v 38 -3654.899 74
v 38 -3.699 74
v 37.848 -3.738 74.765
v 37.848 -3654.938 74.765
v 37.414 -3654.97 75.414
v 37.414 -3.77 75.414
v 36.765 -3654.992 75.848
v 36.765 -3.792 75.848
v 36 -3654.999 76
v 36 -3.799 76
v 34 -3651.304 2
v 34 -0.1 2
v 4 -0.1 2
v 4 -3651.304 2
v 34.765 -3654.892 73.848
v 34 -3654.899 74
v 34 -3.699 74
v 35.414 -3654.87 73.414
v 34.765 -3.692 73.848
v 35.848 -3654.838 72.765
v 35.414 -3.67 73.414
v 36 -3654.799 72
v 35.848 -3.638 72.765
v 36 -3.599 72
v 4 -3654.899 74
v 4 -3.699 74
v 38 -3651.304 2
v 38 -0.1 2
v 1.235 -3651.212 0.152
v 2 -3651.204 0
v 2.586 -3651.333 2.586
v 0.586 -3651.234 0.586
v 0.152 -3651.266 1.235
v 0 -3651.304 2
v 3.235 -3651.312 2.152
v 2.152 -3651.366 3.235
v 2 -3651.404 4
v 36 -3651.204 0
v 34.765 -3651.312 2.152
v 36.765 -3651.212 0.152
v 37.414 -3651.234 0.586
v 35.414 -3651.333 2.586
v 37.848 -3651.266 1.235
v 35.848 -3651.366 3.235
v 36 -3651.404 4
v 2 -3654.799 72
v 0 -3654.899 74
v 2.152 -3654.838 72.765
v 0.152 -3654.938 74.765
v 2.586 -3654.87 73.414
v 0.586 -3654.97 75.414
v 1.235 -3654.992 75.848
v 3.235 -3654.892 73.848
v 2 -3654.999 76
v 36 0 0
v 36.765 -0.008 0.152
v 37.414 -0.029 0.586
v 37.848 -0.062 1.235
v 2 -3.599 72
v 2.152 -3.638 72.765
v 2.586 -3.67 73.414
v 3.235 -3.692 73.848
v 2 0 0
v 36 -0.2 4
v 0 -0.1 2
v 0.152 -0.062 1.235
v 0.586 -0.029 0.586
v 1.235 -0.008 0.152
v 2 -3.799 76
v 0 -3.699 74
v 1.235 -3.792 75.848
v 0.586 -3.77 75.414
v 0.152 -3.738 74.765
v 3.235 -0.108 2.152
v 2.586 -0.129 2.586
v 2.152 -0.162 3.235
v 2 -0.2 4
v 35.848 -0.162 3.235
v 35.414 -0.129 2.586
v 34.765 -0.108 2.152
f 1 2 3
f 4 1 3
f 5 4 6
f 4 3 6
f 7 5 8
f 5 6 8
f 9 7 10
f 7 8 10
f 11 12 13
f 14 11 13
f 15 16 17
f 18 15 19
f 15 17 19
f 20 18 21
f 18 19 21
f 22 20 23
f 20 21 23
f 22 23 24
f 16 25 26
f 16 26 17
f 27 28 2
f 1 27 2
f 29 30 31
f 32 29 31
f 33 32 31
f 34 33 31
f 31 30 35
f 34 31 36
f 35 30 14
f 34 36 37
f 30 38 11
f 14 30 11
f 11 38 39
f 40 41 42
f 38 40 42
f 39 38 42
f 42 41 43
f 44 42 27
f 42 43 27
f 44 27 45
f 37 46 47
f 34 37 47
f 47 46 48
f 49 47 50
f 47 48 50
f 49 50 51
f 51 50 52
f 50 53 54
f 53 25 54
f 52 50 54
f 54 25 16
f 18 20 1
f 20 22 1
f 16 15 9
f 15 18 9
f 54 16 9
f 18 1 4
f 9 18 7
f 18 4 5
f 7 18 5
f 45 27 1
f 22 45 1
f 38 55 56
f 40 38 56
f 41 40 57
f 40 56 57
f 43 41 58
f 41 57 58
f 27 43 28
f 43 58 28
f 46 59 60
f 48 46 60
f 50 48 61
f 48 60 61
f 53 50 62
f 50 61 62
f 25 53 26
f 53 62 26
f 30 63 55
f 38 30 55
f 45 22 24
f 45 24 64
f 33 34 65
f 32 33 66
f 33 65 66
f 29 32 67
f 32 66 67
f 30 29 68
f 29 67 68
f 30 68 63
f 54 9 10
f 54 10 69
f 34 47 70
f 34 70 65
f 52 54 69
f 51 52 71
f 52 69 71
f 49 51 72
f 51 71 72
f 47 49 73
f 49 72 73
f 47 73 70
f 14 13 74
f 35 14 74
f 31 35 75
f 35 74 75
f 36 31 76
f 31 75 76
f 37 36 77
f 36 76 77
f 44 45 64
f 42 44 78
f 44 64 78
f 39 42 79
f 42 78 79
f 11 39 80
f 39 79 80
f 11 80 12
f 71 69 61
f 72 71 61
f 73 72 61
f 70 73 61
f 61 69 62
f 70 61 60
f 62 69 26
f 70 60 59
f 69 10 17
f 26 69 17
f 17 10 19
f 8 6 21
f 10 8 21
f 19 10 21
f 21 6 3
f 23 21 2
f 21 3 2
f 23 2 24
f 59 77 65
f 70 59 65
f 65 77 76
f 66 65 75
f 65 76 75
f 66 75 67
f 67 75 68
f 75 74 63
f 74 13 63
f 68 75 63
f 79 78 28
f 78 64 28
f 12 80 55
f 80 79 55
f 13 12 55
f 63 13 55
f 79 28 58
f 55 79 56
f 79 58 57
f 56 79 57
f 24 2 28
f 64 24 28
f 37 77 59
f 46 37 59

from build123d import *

# Parameters (mm, degrees)
F1_DEPTH = 3655
F3_DEPTH = 38
F5_DEPTH = 38


with BuildPart() as f1:
    # F0 (on Front) → F1 (new body)
    with BuildSketch(Plane.XZ):
        with BuildLine():
            ThreePointArc((0, 2), (0.585786, 0.585786), (2, 0))
            Line((2, 0), (36, 0))
            ThreePointArc((36, 0), (37.414214, 0.585786), (38, 2))
            Line((38, 2), (38, 74))
            ThreePointArc((38, 74), (37.414214, 75.414214), (36, 76))
            Line((36, 76), (2, 76))
            ThreePointArc((2, 76), (0.585786, 75.414214), (0, 74))
            Line((0, 74), (0, 2))
        make_face()
        with BuildLine():
            ThreePointArc((4, 2), (2.585786, 2.585786), (2, 4))
            Line((2, 4), (2, 72))
            ThreePointArc((2, 72), (2.585786, 73.414214), (4, 74))
            Line((4, 74), (34, 74))
            ThreePointArc((34, 74), (35.414214, 73.414214), (36, 72))
            Line((36, 72), (36, 4))
            ThreePointArc((36, 4), (35.414214, 2.585786), (34, 2))
            Line((34, 2), (4, 2))
        make_face(mode=Mode.SUBTRACT)
    extrude(amount=F1_DEPTH)

    # F2 (on face) → F3 (cut)
    with BuildSketch(Plane.YZ.offset(38)):
        Polygon((-3.812936, 76.269533), (0, 0), (0, 76.460153), align=None)
    extrude(amount=-F3_DEPTH, mode=Mode.SUBTRACT)

    # F4 (on face) → F5 (cut)
    with BuildSketch(Plane.YZ.offset(38)):
        Polygon((-3655, 76.016776), (-3655.004636, 0), (-3651.204348, 0), align=None)
    extrude(amount=-F5_DEPTH, mode=Mode.SUBTRACT)


solid = f1.part
